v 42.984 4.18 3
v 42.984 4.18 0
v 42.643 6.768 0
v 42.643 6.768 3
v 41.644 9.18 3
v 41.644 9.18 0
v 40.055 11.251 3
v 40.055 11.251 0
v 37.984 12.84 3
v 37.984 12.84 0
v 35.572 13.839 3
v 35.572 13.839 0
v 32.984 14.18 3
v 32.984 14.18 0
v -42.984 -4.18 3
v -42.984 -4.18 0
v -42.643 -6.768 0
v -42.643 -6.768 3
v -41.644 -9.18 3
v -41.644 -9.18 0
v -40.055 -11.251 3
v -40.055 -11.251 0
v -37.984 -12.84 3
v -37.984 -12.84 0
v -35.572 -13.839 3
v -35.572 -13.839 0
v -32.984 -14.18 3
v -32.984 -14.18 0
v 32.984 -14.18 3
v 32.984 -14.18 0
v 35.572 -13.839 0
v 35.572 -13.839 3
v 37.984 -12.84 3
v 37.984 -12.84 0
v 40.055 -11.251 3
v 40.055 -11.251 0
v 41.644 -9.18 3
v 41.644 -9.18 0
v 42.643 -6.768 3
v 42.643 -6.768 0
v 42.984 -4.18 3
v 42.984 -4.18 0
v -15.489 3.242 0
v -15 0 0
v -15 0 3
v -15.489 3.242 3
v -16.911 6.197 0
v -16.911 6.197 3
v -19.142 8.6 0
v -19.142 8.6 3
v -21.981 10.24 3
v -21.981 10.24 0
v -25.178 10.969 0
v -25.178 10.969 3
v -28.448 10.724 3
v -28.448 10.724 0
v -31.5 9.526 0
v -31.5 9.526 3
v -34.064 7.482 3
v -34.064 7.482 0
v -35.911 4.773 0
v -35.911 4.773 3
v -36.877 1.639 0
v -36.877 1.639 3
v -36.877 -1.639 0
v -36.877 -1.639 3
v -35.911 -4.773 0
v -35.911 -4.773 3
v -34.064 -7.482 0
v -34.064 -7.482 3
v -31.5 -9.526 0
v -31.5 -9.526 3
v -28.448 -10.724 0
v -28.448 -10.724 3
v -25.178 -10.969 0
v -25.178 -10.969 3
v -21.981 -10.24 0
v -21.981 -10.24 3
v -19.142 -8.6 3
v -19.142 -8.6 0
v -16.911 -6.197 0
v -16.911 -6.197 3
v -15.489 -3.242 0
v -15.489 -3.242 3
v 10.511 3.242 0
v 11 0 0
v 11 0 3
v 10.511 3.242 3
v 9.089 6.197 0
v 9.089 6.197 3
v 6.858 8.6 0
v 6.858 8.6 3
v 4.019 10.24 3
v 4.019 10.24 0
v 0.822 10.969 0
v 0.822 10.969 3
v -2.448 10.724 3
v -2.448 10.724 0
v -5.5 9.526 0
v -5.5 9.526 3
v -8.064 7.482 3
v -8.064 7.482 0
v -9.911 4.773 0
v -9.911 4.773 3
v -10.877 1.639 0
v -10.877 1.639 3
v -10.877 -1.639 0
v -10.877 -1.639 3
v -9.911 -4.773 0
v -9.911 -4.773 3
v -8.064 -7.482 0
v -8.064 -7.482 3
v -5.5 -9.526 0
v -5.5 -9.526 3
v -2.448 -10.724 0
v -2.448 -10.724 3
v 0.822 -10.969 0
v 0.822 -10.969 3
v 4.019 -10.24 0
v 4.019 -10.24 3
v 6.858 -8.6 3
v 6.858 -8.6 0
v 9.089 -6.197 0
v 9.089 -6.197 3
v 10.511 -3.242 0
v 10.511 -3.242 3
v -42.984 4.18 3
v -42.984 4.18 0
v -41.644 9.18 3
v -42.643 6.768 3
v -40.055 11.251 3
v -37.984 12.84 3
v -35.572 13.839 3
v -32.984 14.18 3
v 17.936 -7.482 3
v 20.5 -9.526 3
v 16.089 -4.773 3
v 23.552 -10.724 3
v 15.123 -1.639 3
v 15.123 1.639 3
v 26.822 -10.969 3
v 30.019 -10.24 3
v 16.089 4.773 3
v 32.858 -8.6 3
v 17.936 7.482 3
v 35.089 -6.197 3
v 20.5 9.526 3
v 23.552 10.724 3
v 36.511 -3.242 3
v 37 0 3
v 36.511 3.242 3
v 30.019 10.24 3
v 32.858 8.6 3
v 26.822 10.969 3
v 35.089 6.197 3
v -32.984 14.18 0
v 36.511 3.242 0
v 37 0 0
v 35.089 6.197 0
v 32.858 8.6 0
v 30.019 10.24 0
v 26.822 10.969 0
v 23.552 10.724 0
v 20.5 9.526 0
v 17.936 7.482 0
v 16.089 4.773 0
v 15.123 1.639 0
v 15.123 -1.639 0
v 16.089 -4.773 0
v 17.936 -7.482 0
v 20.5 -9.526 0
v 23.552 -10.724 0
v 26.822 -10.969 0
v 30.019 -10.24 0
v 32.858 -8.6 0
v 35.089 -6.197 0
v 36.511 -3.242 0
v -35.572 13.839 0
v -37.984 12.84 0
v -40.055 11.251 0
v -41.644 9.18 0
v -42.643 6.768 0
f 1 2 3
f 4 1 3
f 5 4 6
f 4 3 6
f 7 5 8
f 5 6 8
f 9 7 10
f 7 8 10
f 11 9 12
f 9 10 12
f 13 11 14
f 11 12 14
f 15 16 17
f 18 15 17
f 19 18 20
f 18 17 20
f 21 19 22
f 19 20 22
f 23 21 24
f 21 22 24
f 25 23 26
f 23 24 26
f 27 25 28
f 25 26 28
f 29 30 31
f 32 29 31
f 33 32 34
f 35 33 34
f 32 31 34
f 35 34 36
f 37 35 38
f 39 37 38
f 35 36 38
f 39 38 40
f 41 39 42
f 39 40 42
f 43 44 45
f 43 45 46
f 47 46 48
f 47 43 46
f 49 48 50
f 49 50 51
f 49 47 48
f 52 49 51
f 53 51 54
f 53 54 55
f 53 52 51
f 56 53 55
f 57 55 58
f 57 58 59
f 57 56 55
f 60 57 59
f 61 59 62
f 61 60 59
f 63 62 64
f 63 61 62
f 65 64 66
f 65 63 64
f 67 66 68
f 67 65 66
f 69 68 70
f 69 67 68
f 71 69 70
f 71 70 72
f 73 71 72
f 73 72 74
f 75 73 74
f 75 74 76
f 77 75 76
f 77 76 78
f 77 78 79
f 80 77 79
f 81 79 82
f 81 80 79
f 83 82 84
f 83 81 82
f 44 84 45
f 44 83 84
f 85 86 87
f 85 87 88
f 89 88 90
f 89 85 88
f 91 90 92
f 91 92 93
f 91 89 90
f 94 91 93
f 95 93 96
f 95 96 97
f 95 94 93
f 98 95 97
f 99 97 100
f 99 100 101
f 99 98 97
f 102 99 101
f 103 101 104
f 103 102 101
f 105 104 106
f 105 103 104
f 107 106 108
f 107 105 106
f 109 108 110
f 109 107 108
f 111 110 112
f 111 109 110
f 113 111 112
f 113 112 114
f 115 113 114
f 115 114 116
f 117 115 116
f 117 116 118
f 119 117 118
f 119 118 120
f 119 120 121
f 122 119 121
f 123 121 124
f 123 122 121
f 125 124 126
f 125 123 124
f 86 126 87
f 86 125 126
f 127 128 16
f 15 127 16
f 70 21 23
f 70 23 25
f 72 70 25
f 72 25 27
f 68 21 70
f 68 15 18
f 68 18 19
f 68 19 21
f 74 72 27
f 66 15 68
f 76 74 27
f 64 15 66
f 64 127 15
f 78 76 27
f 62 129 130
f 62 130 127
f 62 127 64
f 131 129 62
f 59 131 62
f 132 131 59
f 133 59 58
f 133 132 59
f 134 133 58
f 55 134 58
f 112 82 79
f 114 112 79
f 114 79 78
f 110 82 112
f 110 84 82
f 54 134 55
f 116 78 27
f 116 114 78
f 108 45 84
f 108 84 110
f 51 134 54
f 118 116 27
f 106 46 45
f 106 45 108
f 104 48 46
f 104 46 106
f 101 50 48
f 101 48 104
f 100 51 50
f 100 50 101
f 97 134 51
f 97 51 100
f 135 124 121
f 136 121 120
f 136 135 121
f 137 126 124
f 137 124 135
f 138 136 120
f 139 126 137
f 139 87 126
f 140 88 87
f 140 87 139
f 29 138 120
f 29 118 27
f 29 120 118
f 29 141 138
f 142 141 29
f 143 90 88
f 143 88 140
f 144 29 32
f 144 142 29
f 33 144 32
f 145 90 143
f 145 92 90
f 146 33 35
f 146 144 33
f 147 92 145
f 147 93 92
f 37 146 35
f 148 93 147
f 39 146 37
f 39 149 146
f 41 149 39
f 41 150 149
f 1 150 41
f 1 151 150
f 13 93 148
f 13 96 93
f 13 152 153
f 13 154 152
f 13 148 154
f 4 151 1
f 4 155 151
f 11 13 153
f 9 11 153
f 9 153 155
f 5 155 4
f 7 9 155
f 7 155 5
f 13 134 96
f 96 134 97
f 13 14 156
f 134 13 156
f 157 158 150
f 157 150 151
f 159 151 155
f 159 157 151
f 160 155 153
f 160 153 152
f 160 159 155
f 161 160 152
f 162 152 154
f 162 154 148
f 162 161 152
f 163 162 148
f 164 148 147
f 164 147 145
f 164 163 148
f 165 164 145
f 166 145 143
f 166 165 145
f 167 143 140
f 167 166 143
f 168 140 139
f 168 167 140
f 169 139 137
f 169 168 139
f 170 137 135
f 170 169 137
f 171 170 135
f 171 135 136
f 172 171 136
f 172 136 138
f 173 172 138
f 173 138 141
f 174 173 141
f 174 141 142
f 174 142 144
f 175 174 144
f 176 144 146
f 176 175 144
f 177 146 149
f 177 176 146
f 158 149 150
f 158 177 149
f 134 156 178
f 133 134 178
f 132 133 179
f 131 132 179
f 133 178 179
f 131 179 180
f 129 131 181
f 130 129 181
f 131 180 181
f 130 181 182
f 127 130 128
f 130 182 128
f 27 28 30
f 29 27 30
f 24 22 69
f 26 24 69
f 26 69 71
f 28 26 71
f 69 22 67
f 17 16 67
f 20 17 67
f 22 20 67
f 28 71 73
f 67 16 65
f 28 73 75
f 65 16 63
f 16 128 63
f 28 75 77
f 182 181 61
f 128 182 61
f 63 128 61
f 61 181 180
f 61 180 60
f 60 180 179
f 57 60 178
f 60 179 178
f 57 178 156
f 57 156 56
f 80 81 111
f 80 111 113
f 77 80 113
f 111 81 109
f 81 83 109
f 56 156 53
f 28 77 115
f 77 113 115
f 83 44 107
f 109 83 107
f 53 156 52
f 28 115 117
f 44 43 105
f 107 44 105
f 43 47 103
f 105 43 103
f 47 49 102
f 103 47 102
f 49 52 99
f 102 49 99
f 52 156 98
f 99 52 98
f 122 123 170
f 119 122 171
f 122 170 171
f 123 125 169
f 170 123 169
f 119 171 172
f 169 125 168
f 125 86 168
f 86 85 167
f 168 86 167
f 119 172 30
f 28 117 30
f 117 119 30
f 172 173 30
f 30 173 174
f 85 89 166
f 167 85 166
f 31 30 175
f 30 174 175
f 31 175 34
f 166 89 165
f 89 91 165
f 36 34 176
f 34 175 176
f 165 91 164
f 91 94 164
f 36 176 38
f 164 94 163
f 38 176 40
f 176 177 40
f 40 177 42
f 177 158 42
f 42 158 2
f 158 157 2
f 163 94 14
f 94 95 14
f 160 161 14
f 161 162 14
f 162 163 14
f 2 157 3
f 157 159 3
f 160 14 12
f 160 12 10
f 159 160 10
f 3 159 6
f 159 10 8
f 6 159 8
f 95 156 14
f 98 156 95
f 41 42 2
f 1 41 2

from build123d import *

# Parameters (mm, degrees)
F0_R     = 11
F1_DEPTH = 3


with BuildPart() as f1:
    # F0 (on Top) → F1 (new body)
    with BuildSketch(Plane.XY):
        with BuildLine():
            Line((32.983547, 14.180062), (-32.983547, 14.180062))
            ThreePointArc((-32.983547, 14.180062), (-40.054615, 11.25113), (-42.983547, 4.180062))
            Line((-42.983547, 4.180062), (-42.983547, -4.180062))
            ThreePointArc((-42.983547, -4.180062), (-40.054615, -11.25113), (-32.983547, -14.180062))
            Line((-32.983547, -14.180062), (32.983547, -14.180062))
            ThreePointArc((32.983547, -14.180062), (40.054615, -11.25113), (42.983547, -4.180062))
            Line((42.983547, -4.180062), (42.983547, 4.180062))
            ThreePointArc((42.983547, 4.180062), (40.054615, 11.25113), (32.983547, 14.180062))
        make_face()
        with Locations((-26, 0)):
            Circle(F0_R, mode=Mode.SUBTRACT)
        Circle(F0_R, mode=Mode.SUBTRACT)
        with Locations((26, 0)):
            Circle(F0_R, mode=Mode.SUBTRACT)
    extrude(amount=F1_DEPTH)


solid = f1.part
